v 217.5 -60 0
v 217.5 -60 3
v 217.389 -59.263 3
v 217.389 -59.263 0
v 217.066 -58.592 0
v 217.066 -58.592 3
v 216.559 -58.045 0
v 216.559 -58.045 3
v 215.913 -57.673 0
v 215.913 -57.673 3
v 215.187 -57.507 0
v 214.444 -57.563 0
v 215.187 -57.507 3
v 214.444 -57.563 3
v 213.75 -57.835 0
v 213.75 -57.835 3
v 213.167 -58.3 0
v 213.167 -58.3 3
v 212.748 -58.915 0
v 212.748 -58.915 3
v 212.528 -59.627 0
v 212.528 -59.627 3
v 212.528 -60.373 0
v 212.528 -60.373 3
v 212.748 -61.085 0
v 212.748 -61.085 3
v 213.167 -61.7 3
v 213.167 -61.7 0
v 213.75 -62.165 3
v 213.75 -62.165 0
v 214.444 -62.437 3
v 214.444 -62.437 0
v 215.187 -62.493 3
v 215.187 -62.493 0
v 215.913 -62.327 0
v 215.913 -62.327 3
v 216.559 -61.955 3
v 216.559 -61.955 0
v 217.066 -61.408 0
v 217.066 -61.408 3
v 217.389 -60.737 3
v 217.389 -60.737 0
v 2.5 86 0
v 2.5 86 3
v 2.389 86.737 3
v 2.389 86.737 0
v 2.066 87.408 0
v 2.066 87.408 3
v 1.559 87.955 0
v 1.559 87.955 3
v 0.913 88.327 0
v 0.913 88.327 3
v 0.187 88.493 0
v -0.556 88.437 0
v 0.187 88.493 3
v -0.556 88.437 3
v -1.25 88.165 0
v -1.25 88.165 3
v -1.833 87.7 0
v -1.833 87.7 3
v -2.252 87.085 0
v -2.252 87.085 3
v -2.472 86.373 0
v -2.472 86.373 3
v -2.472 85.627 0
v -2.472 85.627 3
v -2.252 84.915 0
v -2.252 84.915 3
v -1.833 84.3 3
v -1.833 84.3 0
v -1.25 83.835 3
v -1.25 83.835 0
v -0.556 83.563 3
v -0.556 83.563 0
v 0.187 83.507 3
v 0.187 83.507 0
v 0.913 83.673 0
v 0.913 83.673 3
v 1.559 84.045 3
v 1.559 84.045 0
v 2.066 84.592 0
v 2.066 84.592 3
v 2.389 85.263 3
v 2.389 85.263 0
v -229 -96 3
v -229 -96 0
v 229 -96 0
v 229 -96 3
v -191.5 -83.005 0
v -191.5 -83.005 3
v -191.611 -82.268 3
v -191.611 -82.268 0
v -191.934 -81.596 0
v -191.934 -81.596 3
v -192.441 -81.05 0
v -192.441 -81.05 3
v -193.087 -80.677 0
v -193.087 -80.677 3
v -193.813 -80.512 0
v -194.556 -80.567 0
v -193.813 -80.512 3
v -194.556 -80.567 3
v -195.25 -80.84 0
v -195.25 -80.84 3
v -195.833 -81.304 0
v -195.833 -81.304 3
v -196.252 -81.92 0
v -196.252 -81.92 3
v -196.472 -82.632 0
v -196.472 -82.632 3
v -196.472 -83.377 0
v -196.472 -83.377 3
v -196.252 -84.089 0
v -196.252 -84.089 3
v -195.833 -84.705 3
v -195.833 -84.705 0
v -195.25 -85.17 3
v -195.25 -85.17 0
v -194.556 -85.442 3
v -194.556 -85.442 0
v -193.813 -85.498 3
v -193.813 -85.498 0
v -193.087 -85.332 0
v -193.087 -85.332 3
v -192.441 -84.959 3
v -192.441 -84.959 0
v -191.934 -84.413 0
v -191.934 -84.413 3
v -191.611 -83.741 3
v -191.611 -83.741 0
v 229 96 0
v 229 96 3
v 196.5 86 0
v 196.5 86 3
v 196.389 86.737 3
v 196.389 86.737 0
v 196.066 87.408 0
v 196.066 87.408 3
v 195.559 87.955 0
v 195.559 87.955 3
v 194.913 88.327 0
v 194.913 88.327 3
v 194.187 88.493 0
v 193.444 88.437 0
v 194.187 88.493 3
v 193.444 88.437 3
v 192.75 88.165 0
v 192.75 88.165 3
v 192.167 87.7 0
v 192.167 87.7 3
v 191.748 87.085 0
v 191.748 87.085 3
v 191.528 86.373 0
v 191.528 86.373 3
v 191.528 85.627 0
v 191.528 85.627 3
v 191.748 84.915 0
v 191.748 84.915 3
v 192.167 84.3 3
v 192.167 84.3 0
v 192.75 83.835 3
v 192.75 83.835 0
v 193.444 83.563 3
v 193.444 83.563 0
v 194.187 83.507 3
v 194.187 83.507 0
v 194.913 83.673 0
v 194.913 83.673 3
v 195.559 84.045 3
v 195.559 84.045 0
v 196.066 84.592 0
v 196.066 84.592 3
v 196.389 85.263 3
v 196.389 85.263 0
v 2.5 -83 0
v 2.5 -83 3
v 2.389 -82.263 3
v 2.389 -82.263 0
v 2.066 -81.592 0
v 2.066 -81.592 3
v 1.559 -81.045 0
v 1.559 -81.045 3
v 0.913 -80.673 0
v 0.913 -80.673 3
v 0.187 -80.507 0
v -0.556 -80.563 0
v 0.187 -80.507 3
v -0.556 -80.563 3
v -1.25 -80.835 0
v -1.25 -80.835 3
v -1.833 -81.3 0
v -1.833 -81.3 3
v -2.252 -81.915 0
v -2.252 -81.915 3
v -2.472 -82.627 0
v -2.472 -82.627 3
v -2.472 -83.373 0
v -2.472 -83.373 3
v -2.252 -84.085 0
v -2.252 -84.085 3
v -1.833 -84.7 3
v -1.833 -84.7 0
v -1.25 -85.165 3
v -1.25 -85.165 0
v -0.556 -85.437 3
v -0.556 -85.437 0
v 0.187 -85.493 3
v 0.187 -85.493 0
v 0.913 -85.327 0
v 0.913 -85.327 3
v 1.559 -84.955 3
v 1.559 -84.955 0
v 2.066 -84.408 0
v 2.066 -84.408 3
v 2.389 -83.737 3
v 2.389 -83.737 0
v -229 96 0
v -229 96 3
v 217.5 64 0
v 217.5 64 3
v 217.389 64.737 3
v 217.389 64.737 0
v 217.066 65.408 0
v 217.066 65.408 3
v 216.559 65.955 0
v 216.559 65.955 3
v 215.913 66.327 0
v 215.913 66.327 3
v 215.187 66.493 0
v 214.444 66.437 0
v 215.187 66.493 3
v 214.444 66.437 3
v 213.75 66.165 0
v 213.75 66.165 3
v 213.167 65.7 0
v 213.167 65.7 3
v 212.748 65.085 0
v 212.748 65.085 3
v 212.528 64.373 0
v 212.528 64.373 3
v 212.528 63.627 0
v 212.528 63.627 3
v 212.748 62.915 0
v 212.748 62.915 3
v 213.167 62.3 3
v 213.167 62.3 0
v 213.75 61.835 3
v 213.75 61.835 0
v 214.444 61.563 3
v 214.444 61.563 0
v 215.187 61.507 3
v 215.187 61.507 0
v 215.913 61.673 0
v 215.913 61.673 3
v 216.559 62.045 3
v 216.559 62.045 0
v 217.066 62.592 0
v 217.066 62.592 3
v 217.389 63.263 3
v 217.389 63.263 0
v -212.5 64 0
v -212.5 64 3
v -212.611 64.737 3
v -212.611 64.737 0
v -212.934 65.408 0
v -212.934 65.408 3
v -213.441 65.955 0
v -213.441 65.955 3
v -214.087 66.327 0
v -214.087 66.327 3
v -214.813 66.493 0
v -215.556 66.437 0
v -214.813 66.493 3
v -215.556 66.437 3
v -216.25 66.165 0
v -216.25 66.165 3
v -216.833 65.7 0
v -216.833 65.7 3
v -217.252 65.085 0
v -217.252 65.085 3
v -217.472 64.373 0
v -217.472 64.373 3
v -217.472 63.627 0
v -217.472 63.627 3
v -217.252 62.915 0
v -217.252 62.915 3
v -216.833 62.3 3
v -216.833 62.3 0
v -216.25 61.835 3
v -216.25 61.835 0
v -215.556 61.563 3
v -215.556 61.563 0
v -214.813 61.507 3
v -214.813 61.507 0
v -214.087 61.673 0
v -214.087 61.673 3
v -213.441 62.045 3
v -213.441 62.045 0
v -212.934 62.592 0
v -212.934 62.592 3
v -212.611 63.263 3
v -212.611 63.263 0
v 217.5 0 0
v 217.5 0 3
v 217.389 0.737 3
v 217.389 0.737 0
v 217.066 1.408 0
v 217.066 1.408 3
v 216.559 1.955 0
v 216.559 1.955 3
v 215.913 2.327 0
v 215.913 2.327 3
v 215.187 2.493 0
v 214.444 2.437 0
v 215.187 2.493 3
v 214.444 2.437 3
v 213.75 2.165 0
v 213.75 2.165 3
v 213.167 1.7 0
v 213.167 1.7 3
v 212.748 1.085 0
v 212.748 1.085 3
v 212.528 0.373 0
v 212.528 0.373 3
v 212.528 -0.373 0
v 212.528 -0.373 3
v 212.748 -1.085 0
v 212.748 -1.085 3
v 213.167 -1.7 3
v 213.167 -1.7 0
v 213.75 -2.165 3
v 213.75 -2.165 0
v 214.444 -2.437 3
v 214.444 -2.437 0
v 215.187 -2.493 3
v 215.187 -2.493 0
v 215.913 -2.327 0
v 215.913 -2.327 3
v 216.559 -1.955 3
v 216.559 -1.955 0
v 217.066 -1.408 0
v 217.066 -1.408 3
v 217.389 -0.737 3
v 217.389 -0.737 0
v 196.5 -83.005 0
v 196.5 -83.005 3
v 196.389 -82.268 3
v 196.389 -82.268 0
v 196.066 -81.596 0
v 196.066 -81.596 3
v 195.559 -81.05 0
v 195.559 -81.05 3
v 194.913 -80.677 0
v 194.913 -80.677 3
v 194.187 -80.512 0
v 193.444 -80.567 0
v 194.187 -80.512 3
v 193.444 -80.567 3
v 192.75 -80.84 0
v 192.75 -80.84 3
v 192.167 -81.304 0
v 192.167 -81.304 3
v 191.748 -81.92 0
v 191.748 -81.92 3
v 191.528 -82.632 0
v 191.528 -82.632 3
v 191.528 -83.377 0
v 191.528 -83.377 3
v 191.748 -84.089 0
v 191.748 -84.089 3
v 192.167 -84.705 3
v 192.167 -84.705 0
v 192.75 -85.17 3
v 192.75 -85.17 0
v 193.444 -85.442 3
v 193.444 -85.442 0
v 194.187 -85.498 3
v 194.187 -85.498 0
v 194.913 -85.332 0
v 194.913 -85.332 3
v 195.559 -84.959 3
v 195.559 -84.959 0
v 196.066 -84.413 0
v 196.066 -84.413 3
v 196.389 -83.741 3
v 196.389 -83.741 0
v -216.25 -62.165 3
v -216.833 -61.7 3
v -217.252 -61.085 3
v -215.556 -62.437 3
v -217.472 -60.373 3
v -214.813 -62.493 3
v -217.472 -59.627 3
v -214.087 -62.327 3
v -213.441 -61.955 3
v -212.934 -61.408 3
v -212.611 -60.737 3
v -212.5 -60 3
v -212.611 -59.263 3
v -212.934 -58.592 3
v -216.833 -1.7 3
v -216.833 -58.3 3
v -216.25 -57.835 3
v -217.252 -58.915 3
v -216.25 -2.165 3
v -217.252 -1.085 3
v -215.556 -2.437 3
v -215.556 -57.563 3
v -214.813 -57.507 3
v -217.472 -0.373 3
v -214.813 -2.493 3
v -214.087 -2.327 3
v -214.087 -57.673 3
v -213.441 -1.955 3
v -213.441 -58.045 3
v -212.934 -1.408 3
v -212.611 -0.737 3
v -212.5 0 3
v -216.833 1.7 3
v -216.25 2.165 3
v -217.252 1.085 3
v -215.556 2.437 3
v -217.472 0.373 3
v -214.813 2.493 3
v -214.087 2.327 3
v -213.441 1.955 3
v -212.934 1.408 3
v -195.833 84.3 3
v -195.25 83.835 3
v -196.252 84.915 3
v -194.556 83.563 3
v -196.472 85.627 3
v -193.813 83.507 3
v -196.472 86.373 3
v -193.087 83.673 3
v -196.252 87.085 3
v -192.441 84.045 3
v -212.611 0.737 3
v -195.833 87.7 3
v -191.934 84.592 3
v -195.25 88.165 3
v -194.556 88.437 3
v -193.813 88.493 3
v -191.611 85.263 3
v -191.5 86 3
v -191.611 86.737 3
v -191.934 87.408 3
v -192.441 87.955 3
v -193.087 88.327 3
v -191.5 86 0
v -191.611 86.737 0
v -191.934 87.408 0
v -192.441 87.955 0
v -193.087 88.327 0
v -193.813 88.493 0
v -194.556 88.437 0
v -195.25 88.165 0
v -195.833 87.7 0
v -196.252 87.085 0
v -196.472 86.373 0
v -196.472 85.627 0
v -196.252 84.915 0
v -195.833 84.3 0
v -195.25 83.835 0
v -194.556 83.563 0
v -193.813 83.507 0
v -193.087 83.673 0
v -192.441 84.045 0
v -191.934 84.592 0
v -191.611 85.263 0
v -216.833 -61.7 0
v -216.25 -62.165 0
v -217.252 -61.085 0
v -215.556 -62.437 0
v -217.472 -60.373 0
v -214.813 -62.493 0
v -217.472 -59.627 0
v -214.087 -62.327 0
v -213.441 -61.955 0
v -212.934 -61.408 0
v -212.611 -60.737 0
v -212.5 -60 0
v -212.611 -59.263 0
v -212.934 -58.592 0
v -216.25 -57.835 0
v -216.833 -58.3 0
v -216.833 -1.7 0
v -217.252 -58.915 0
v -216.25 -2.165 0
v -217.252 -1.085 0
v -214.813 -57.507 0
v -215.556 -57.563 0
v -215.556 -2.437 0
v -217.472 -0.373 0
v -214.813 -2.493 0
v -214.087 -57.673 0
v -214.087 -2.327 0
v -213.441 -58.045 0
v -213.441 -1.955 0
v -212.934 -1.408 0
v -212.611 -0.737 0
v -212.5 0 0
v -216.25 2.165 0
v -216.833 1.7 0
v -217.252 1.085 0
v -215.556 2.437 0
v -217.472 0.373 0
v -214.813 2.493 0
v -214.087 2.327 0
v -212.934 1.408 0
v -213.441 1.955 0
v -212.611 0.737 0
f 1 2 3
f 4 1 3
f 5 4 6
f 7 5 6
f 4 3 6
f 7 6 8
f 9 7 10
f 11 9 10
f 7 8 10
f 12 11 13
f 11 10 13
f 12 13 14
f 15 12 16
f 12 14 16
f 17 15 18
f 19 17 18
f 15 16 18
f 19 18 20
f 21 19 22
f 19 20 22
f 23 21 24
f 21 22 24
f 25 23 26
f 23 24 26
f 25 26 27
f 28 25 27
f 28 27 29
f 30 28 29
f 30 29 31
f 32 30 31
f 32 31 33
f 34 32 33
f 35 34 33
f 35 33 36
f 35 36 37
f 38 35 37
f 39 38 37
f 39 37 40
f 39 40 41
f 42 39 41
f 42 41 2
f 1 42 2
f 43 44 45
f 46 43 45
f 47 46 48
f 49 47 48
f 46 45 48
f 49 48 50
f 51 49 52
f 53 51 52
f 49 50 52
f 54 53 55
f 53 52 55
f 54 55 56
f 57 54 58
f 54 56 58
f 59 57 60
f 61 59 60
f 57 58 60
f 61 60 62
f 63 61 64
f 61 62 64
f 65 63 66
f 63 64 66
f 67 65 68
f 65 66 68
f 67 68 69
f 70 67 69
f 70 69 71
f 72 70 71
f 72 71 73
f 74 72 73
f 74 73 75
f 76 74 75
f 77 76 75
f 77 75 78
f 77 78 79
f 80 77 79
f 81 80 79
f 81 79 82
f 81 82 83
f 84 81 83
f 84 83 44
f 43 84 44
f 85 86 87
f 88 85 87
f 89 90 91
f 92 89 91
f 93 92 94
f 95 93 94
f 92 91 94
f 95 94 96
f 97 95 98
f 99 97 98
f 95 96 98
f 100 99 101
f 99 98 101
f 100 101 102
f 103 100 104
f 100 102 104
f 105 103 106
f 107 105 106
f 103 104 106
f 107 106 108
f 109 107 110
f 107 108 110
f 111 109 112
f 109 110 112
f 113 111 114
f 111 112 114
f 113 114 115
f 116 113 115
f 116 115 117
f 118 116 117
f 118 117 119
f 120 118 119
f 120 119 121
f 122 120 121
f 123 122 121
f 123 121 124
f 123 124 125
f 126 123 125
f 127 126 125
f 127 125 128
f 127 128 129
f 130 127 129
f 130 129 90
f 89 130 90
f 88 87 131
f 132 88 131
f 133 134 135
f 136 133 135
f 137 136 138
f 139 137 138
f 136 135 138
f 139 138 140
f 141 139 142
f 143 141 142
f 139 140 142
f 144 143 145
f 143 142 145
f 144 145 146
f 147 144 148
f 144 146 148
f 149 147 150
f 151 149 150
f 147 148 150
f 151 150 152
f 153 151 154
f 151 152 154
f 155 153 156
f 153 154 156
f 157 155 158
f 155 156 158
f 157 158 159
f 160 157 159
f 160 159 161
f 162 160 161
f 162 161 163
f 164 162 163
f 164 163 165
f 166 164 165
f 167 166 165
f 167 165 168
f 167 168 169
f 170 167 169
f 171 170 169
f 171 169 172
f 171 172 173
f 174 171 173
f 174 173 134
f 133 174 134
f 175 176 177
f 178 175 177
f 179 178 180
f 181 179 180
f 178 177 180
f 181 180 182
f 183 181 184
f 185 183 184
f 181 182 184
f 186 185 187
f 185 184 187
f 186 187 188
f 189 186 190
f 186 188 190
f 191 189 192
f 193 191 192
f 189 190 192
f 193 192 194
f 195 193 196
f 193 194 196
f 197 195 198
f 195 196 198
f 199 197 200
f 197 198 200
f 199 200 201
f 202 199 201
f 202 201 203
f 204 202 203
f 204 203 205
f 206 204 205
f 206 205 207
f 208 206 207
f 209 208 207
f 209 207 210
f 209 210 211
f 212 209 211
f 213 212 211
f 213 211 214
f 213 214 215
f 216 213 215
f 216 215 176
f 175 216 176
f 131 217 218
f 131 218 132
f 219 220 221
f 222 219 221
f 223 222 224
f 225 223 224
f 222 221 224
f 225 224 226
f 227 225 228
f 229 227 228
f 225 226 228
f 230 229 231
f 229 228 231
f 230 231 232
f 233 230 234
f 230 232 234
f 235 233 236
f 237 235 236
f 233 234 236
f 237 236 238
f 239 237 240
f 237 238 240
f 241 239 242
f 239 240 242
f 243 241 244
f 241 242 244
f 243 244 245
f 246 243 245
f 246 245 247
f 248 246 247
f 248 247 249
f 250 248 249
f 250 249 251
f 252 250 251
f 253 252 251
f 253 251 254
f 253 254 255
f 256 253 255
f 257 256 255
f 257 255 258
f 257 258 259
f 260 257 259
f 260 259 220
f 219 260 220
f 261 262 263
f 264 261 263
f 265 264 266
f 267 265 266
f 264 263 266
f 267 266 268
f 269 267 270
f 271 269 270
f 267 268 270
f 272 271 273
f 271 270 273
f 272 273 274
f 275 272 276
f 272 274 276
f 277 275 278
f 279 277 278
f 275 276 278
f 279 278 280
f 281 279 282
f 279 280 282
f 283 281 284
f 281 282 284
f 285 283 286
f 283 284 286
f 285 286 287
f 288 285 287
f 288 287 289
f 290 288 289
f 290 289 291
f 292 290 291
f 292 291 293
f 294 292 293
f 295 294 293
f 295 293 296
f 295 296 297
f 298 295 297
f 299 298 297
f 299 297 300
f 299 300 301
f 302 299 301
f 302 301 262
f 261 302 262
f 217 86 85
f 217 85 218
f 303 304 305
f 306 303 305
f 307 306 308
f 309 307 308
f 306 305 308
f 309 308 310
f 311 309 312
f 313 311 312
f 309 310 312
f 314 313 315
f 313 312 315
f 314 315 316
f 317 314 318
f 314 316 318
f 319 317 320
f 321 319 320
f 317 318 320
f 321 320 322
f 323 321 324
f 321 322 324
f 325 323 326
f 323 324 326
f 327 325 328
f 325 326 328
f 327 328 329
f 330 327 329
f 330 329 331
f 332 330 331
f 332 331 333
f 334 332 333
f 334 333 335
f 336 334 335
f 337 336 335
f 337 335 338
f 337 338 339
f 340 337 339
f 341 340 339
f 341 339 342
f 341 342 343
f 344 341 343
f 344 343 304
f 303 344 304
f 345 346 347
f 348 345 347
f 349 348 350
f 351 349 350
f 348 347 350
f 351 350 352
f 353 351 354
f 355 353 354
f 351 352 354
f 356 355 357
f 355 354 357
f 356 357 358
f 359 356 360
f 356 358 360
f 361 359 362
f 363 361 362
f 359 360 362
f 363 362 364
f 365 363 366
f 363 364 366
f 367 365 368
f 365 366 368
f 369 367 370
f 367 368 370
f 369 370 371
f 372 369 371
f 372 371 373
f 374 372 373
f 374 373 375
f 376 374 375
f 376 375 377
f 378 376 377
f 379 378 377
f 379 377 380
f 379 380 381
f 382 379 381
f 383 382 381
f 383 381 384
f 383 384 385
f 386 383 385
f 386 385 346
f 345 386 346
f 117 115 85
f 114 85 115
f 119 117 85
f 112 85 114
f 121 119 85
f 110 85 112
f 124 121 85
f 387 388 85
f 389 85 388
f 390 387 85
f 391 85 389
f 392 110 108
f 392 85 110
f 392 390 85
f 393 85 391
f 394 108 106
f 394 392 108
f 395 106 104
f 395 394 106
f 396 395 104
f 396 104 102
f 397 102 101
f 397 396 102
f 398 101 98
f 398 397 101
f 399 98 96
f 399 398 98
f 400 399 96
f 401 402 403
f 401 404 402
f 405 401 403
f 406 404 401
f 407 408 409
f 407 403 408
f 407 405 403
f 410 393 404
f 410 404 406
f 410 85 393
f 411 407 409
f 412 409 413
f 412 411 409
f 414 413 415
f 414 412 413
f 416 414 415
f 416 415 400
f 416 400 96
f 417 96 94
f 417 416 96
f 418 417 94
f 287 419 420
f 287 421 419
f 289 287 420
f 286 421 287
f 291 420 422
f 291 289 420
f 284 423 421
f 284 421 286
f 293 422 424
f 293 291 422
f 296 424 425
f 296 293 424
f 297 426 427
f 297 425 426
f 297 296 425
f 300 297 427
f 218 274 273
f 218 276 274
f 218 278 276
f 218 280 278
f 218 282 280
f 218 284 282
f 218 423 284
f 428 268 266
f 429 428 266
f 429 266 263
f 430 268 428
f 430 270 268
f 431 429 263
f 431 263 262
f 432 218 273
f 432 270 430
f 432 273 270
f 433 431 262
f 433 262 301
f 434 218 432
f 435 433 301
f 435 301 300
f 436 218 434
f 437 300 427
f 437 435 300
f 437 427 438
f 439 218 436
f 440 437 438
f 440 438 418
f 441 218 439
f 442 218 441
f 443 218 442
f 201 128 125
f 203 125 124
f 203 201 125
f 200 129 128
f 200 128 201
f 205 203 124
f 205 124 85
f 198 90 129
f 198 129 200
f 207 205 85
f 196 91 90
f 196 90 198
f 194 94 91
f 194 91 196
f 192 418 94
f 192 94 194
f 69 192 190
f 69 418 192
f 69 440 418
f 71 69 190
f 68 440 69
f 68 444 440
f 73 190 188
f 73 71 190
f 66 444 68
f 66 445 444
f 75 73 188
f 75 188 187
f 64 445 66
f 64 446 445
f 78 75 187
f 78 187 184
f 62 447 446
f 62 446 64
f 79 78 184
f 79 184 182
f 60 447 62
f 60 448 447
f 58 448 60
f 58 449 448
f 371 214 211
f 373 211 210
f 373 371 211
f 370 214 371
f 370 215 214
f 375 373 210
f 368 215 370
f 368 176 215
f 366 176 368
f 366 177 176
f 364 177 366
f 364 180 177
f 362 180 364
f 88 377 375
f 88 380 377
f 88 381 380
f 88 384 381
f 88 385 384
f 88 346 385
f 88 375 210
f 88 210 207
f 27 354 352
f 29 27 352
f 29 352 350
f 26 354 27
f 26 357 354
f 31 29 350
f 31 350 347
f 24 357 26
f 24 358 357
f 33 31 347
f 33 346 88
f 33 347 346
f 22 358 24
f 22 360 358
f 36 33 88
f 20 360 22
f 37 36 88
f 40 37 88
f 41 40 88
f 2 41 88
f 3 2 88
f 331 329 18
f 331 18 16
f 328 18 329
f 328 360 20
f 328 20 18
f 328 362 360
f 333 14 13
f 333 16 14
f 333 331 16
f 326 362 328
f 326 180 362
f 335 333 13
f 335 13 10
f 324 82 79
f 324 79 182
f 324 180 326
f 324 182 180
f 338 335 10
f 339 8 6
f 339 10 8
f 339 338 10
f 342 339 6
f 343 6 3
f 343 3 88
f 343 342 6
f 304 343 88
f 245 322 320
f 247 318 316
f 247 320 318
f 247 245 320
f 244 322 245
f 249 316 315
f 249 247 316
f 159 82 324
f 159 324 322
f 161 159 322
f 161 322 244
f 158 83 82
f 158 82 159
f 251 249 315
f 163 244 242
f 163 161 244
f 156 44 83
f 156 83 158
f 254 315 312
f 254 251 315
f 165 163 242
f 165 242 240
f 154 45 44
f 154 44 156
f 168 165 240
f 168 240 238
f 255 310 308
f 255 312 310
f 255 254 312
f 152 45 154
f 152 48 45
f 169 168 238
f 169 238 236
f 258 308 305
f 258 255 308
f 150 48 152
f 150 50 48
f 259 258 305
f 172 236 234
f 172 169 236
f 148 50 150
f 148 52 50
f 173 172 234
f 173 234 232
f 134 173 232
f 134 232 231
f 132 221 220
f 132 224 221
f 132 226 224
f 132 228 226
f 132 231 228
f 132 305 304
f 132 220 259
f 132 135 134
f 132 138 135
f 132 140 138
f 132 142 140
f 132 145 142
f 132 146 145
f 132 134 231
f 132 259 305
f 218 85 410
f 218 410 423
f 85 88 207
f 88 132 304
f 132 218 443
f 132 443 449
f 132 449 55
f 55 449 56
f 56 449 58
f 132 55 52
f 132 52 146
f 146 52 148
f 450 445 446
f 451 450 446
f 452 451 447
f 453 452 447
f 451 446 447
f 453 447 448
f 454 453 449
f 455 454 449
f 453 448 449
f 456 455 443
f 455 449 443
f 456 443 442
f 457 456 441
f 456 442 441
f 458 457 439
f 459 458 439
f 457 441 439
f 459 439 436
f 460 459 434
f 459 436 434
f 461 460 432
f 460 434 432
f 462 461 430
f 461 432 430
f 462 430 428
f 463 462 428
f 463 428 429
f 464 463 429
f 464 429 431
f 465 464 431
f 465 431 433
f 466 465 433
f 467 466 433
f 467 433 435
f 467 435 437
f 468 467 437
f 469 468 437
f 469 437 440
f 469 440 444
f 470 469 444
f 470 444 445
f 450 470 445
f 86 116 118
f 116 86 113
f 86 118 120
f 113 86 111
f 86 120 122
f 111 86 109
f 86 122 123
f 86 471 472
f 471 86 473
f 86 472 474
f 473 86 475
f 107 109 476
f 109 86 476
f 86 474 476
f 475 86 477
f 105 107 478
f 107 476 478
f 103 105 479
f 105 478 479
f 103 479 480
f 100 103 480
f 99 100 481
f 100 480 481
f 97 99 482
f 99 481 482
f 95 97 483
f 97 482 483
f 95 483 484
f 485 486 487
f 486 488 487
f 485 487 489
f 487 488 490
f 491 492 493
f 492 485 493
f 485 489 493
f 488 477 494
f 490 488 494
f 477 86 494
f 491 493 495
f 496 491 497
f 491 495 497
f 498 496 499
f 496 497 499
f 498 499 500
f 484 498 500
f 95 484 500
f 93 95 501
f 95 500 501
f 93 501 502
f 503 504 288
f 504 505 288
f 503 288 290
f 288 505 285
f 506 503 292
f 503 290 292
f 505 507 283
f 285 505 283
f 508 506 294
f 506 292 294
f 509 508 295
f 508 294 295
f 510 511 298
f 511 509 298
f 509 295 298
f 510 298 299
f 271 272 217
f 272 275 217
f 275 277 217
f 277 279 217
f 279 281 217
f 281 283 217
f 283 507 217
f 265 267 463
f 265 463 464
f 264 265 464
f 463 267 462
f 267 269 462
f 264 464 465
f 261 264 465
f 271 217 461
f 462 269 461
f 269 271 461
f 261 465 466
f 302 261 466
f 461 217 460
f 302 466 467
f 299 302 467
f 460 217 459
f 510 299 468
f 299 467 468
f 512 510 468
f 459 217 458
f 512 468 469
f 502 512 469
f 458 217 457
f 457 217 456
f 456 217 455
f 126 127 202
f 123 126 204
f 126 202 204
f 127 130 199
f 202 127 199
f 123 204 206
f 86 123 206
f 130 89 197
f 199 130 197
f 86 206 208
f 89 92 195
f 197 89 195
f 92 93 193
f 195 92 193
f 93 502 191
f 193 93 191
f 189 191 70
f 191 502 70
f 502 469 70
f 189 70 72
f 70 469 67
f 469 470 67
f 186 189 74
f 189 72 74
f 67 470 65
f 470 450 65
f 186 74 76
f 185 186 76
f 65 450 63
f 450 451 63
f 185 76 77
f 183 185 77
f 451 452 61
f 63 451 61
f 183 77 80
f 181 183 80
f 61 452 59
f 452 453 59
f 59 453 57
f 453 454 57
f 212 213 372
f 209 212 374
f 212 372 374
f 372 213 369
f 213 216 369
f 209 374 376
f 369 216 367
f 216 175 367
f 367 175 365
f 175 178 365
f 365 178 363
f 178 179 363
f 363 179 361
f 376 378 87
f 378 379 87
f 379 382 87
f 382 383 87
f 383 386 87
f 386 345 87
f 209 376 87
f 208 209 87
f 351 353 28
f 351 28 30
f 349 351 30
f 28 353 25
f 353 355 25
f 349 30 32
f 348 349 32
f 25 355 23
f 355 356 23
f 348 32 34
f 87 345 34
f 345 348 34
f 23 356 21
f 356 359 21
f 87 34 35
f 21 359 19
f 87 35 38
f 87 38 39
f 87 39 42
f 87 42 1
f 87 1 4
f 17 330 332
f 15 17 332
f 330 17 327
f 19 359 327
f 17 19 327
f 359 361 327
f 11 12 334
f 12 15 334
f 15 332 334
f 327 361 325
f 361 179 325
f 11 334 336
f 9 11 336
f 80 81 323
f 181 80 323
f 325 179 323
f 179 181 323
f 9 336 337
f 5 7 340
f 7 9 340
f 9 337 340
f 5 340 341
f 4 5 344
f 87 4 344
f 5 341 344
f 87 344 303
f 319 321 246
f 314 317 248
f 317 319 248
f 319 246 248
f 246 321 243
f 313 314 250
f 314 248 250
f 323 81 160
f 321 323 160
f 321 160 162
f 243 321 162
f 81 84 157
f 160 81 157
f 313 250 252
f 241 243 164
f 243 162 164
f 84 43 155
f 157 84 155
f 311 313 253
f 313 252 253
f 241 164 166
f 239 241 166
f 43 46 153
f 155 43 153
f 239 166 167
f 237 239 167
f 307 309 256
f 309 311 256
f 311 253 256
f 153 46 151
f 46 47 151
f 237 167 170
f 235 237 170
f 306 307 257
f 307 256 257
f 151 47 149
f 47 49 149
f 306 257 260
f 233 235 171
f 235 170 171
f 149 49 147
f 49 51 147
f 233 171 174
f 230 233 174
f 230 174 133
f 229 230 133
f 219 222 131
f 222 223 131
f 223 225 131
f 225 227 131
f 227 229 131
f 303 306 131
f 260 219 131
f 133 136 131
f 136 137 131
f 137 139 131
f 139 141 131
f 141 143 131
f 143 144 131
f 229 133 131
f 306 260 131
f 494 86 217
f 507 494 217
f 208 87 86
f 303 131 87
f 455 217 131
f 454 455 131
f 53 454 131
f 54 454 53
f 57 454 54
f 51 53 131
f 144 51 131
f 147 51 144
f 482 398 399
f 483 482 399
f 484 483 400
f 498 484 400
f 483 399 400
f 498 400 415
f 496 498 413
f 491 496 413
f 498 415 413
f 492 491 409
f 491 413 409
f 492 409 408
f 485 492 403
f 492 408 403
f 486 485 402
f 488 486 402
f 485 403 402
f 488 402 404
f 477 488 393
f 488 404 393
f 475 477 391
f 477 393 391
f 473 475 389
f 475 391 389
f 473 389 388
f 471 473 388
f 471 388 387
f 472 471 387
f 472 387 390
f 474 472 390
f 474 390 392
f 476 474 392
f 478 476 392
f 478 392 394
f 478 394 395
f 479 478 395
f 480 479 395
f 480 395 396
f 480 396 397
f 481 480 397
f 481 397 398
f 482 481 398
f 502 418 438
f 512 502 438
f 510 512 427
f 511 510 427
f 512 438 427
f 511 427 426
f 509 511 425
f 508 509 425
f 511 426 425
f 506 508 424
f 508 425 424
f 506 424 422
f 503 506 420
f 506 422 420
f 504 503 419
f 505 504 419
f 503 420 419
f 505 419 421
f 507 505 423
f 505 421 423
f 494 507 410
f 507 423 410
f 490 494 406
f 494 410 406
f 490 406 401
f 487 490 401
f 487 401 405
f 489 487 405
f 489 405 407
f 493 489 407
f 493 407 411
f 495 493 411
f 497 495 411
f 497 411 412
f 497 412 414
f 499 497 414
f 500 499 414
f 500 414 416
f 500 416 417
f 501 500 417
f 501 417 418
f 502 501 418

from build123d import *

# Parameters (mm, degrees)
SKETCH1_W           = 458
SKETCH1_H           = 192
BOSS_EXTRUDE1_DEPTH = 3
SKETCH2_R           = 2.5
CUT_EXTRUDE1_DEPTH  = 249.326398113


with BuildPart() as part:
    # Sketch1 → Boss-Extrude1 (new body)
    with BuildSketch(Plane.XY):
        Rectangle(SKETCH1_W, SKETCH1_H)
    extrude(amount=BOSS_EXTRUDE1_DEPTH)

    # Sketch2 → Cut-Extrude1 (cut, through all)
    with BuildSketch(Plane.XY.offset(3)):
        with Locations((-194, 86)):
            Circle(SKETCH2_R)
        with Locations((-194, -83.004592541)):
            Circle(SKETCH2_R)
        with Locations((194, -83.004592541)):
            Circle(SKETCH2_R)
        with Locations((194, 86)):
            Circle(SKETCH2_R)
        with Locations((-215, 0)):
            Circle(SKETCH2_R)
        with Locations((-215, -60)):
            Circle(SKETCH2_R)
        with Locations((-215, 64)):
            Circle(SKETCH2_R)
        with Locations((215, 0)):
            Circle(SKETCH2_R)
        with Locations((215, -60)):
            Circle(SKETCH2_R)
        with Locations((215, 64)):
            Circle(SKETCH2_R)
        with Locations((0, 86)):
            Circle(SKETCH2_R)
        with Locations((0, -83)):
            Circle(SKETCH2_R)
    extrude(amount=-CUT_EXTRUDE1_DEPTH, mode=Mode.SUBTRACT)


solid = part.part
